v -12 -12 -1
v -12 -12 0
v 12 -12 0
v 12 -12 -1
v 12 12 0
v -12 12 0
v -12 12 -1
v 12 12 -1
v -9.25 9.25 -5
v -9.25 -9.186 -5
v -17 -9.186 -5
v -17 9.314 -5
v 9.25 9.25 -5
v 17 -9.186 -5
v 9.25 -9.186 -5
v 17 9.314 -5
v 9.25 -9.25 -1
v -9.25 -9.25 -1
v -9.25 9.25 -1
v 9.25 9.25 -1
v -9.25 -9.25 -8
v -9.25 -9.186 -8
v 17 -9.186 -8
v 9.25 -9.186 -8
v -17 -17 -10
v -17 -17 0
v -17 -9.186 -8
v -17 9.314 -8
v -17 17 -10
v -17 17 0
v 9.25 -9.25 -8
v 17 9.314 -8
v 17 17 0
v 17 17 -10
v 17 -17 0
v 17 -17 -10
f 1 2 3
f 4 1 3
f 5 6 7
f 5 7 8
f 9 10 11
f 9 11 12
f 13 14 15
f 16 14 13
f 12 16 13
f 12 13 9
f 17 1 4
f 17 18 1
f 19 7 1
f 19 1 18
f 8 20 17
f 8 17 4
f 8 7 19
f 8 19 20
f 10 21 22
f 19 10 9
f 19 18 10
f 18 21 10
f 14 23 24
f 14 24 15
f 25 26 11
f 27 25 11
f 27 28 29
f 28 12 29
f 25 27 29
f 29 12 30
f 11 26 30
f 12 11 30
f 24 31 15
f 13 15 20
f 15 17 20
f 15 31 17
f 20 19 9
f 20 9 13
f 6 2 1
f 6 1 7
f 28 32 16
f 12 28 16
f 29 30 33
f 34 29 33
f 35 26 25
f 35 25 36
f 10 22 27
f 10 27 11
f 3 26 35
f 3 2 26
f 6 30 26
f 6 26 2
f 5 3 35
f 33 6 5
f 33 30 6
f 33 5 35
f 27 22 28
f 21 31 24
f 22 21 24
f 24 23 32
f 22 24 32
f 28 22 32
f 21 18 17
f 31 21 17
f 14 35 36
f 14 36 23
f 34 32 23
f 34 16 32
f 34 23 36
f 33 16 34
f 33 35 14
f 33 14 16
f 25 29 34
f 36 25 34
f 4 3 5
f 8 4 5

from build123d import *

# Parameters (mm, degrees)
F2_W     = 34
F2_H     = 34
F3_DEPTH = 10
F1_W     = 24
F1_H     = 24
F4_DEPTH = 1
F0_W     = 18.5
F0_H     = 18.5
F5_DEPTH = 8
F6_W     = 18.5
F6_H     = 3
F7_DEPTH = 34


with BuildPart() as f3:
    # F2 (on Top) → F3 (new body)
    with BuildSketch(Plane.XY):
        Rectangle(F2_W, F2_H)
    extrude(amount=-F3_DEPTH)

    # F1 (on Top) → F4 (cut)
    with BuildSketch(Plane.XY):
        Rectangle(F1_W, F1_H)
    extrude(amount=-F4_DEPTH, mode=Mode.SUBTRACT)

    # F0 (on Top) → F5 (cut)
    with BuildSketch(Plane.XY):
        Rectangle(F0_W, F0_H)
    extrude(amount=-F5_DEPTH, mode=Mode.SUBTRACT)

    # F6 (on face) → F7 (cut)
    with BuildSketch(Plane.YZ.offset(17)):
        with Locations((0.064, -6.5)):
            Rectangle(F6_W, F6_H)
    extrude(amount=-F7_DEPTH, mode=Mode.SUBTRACT)


solid = f3.part
